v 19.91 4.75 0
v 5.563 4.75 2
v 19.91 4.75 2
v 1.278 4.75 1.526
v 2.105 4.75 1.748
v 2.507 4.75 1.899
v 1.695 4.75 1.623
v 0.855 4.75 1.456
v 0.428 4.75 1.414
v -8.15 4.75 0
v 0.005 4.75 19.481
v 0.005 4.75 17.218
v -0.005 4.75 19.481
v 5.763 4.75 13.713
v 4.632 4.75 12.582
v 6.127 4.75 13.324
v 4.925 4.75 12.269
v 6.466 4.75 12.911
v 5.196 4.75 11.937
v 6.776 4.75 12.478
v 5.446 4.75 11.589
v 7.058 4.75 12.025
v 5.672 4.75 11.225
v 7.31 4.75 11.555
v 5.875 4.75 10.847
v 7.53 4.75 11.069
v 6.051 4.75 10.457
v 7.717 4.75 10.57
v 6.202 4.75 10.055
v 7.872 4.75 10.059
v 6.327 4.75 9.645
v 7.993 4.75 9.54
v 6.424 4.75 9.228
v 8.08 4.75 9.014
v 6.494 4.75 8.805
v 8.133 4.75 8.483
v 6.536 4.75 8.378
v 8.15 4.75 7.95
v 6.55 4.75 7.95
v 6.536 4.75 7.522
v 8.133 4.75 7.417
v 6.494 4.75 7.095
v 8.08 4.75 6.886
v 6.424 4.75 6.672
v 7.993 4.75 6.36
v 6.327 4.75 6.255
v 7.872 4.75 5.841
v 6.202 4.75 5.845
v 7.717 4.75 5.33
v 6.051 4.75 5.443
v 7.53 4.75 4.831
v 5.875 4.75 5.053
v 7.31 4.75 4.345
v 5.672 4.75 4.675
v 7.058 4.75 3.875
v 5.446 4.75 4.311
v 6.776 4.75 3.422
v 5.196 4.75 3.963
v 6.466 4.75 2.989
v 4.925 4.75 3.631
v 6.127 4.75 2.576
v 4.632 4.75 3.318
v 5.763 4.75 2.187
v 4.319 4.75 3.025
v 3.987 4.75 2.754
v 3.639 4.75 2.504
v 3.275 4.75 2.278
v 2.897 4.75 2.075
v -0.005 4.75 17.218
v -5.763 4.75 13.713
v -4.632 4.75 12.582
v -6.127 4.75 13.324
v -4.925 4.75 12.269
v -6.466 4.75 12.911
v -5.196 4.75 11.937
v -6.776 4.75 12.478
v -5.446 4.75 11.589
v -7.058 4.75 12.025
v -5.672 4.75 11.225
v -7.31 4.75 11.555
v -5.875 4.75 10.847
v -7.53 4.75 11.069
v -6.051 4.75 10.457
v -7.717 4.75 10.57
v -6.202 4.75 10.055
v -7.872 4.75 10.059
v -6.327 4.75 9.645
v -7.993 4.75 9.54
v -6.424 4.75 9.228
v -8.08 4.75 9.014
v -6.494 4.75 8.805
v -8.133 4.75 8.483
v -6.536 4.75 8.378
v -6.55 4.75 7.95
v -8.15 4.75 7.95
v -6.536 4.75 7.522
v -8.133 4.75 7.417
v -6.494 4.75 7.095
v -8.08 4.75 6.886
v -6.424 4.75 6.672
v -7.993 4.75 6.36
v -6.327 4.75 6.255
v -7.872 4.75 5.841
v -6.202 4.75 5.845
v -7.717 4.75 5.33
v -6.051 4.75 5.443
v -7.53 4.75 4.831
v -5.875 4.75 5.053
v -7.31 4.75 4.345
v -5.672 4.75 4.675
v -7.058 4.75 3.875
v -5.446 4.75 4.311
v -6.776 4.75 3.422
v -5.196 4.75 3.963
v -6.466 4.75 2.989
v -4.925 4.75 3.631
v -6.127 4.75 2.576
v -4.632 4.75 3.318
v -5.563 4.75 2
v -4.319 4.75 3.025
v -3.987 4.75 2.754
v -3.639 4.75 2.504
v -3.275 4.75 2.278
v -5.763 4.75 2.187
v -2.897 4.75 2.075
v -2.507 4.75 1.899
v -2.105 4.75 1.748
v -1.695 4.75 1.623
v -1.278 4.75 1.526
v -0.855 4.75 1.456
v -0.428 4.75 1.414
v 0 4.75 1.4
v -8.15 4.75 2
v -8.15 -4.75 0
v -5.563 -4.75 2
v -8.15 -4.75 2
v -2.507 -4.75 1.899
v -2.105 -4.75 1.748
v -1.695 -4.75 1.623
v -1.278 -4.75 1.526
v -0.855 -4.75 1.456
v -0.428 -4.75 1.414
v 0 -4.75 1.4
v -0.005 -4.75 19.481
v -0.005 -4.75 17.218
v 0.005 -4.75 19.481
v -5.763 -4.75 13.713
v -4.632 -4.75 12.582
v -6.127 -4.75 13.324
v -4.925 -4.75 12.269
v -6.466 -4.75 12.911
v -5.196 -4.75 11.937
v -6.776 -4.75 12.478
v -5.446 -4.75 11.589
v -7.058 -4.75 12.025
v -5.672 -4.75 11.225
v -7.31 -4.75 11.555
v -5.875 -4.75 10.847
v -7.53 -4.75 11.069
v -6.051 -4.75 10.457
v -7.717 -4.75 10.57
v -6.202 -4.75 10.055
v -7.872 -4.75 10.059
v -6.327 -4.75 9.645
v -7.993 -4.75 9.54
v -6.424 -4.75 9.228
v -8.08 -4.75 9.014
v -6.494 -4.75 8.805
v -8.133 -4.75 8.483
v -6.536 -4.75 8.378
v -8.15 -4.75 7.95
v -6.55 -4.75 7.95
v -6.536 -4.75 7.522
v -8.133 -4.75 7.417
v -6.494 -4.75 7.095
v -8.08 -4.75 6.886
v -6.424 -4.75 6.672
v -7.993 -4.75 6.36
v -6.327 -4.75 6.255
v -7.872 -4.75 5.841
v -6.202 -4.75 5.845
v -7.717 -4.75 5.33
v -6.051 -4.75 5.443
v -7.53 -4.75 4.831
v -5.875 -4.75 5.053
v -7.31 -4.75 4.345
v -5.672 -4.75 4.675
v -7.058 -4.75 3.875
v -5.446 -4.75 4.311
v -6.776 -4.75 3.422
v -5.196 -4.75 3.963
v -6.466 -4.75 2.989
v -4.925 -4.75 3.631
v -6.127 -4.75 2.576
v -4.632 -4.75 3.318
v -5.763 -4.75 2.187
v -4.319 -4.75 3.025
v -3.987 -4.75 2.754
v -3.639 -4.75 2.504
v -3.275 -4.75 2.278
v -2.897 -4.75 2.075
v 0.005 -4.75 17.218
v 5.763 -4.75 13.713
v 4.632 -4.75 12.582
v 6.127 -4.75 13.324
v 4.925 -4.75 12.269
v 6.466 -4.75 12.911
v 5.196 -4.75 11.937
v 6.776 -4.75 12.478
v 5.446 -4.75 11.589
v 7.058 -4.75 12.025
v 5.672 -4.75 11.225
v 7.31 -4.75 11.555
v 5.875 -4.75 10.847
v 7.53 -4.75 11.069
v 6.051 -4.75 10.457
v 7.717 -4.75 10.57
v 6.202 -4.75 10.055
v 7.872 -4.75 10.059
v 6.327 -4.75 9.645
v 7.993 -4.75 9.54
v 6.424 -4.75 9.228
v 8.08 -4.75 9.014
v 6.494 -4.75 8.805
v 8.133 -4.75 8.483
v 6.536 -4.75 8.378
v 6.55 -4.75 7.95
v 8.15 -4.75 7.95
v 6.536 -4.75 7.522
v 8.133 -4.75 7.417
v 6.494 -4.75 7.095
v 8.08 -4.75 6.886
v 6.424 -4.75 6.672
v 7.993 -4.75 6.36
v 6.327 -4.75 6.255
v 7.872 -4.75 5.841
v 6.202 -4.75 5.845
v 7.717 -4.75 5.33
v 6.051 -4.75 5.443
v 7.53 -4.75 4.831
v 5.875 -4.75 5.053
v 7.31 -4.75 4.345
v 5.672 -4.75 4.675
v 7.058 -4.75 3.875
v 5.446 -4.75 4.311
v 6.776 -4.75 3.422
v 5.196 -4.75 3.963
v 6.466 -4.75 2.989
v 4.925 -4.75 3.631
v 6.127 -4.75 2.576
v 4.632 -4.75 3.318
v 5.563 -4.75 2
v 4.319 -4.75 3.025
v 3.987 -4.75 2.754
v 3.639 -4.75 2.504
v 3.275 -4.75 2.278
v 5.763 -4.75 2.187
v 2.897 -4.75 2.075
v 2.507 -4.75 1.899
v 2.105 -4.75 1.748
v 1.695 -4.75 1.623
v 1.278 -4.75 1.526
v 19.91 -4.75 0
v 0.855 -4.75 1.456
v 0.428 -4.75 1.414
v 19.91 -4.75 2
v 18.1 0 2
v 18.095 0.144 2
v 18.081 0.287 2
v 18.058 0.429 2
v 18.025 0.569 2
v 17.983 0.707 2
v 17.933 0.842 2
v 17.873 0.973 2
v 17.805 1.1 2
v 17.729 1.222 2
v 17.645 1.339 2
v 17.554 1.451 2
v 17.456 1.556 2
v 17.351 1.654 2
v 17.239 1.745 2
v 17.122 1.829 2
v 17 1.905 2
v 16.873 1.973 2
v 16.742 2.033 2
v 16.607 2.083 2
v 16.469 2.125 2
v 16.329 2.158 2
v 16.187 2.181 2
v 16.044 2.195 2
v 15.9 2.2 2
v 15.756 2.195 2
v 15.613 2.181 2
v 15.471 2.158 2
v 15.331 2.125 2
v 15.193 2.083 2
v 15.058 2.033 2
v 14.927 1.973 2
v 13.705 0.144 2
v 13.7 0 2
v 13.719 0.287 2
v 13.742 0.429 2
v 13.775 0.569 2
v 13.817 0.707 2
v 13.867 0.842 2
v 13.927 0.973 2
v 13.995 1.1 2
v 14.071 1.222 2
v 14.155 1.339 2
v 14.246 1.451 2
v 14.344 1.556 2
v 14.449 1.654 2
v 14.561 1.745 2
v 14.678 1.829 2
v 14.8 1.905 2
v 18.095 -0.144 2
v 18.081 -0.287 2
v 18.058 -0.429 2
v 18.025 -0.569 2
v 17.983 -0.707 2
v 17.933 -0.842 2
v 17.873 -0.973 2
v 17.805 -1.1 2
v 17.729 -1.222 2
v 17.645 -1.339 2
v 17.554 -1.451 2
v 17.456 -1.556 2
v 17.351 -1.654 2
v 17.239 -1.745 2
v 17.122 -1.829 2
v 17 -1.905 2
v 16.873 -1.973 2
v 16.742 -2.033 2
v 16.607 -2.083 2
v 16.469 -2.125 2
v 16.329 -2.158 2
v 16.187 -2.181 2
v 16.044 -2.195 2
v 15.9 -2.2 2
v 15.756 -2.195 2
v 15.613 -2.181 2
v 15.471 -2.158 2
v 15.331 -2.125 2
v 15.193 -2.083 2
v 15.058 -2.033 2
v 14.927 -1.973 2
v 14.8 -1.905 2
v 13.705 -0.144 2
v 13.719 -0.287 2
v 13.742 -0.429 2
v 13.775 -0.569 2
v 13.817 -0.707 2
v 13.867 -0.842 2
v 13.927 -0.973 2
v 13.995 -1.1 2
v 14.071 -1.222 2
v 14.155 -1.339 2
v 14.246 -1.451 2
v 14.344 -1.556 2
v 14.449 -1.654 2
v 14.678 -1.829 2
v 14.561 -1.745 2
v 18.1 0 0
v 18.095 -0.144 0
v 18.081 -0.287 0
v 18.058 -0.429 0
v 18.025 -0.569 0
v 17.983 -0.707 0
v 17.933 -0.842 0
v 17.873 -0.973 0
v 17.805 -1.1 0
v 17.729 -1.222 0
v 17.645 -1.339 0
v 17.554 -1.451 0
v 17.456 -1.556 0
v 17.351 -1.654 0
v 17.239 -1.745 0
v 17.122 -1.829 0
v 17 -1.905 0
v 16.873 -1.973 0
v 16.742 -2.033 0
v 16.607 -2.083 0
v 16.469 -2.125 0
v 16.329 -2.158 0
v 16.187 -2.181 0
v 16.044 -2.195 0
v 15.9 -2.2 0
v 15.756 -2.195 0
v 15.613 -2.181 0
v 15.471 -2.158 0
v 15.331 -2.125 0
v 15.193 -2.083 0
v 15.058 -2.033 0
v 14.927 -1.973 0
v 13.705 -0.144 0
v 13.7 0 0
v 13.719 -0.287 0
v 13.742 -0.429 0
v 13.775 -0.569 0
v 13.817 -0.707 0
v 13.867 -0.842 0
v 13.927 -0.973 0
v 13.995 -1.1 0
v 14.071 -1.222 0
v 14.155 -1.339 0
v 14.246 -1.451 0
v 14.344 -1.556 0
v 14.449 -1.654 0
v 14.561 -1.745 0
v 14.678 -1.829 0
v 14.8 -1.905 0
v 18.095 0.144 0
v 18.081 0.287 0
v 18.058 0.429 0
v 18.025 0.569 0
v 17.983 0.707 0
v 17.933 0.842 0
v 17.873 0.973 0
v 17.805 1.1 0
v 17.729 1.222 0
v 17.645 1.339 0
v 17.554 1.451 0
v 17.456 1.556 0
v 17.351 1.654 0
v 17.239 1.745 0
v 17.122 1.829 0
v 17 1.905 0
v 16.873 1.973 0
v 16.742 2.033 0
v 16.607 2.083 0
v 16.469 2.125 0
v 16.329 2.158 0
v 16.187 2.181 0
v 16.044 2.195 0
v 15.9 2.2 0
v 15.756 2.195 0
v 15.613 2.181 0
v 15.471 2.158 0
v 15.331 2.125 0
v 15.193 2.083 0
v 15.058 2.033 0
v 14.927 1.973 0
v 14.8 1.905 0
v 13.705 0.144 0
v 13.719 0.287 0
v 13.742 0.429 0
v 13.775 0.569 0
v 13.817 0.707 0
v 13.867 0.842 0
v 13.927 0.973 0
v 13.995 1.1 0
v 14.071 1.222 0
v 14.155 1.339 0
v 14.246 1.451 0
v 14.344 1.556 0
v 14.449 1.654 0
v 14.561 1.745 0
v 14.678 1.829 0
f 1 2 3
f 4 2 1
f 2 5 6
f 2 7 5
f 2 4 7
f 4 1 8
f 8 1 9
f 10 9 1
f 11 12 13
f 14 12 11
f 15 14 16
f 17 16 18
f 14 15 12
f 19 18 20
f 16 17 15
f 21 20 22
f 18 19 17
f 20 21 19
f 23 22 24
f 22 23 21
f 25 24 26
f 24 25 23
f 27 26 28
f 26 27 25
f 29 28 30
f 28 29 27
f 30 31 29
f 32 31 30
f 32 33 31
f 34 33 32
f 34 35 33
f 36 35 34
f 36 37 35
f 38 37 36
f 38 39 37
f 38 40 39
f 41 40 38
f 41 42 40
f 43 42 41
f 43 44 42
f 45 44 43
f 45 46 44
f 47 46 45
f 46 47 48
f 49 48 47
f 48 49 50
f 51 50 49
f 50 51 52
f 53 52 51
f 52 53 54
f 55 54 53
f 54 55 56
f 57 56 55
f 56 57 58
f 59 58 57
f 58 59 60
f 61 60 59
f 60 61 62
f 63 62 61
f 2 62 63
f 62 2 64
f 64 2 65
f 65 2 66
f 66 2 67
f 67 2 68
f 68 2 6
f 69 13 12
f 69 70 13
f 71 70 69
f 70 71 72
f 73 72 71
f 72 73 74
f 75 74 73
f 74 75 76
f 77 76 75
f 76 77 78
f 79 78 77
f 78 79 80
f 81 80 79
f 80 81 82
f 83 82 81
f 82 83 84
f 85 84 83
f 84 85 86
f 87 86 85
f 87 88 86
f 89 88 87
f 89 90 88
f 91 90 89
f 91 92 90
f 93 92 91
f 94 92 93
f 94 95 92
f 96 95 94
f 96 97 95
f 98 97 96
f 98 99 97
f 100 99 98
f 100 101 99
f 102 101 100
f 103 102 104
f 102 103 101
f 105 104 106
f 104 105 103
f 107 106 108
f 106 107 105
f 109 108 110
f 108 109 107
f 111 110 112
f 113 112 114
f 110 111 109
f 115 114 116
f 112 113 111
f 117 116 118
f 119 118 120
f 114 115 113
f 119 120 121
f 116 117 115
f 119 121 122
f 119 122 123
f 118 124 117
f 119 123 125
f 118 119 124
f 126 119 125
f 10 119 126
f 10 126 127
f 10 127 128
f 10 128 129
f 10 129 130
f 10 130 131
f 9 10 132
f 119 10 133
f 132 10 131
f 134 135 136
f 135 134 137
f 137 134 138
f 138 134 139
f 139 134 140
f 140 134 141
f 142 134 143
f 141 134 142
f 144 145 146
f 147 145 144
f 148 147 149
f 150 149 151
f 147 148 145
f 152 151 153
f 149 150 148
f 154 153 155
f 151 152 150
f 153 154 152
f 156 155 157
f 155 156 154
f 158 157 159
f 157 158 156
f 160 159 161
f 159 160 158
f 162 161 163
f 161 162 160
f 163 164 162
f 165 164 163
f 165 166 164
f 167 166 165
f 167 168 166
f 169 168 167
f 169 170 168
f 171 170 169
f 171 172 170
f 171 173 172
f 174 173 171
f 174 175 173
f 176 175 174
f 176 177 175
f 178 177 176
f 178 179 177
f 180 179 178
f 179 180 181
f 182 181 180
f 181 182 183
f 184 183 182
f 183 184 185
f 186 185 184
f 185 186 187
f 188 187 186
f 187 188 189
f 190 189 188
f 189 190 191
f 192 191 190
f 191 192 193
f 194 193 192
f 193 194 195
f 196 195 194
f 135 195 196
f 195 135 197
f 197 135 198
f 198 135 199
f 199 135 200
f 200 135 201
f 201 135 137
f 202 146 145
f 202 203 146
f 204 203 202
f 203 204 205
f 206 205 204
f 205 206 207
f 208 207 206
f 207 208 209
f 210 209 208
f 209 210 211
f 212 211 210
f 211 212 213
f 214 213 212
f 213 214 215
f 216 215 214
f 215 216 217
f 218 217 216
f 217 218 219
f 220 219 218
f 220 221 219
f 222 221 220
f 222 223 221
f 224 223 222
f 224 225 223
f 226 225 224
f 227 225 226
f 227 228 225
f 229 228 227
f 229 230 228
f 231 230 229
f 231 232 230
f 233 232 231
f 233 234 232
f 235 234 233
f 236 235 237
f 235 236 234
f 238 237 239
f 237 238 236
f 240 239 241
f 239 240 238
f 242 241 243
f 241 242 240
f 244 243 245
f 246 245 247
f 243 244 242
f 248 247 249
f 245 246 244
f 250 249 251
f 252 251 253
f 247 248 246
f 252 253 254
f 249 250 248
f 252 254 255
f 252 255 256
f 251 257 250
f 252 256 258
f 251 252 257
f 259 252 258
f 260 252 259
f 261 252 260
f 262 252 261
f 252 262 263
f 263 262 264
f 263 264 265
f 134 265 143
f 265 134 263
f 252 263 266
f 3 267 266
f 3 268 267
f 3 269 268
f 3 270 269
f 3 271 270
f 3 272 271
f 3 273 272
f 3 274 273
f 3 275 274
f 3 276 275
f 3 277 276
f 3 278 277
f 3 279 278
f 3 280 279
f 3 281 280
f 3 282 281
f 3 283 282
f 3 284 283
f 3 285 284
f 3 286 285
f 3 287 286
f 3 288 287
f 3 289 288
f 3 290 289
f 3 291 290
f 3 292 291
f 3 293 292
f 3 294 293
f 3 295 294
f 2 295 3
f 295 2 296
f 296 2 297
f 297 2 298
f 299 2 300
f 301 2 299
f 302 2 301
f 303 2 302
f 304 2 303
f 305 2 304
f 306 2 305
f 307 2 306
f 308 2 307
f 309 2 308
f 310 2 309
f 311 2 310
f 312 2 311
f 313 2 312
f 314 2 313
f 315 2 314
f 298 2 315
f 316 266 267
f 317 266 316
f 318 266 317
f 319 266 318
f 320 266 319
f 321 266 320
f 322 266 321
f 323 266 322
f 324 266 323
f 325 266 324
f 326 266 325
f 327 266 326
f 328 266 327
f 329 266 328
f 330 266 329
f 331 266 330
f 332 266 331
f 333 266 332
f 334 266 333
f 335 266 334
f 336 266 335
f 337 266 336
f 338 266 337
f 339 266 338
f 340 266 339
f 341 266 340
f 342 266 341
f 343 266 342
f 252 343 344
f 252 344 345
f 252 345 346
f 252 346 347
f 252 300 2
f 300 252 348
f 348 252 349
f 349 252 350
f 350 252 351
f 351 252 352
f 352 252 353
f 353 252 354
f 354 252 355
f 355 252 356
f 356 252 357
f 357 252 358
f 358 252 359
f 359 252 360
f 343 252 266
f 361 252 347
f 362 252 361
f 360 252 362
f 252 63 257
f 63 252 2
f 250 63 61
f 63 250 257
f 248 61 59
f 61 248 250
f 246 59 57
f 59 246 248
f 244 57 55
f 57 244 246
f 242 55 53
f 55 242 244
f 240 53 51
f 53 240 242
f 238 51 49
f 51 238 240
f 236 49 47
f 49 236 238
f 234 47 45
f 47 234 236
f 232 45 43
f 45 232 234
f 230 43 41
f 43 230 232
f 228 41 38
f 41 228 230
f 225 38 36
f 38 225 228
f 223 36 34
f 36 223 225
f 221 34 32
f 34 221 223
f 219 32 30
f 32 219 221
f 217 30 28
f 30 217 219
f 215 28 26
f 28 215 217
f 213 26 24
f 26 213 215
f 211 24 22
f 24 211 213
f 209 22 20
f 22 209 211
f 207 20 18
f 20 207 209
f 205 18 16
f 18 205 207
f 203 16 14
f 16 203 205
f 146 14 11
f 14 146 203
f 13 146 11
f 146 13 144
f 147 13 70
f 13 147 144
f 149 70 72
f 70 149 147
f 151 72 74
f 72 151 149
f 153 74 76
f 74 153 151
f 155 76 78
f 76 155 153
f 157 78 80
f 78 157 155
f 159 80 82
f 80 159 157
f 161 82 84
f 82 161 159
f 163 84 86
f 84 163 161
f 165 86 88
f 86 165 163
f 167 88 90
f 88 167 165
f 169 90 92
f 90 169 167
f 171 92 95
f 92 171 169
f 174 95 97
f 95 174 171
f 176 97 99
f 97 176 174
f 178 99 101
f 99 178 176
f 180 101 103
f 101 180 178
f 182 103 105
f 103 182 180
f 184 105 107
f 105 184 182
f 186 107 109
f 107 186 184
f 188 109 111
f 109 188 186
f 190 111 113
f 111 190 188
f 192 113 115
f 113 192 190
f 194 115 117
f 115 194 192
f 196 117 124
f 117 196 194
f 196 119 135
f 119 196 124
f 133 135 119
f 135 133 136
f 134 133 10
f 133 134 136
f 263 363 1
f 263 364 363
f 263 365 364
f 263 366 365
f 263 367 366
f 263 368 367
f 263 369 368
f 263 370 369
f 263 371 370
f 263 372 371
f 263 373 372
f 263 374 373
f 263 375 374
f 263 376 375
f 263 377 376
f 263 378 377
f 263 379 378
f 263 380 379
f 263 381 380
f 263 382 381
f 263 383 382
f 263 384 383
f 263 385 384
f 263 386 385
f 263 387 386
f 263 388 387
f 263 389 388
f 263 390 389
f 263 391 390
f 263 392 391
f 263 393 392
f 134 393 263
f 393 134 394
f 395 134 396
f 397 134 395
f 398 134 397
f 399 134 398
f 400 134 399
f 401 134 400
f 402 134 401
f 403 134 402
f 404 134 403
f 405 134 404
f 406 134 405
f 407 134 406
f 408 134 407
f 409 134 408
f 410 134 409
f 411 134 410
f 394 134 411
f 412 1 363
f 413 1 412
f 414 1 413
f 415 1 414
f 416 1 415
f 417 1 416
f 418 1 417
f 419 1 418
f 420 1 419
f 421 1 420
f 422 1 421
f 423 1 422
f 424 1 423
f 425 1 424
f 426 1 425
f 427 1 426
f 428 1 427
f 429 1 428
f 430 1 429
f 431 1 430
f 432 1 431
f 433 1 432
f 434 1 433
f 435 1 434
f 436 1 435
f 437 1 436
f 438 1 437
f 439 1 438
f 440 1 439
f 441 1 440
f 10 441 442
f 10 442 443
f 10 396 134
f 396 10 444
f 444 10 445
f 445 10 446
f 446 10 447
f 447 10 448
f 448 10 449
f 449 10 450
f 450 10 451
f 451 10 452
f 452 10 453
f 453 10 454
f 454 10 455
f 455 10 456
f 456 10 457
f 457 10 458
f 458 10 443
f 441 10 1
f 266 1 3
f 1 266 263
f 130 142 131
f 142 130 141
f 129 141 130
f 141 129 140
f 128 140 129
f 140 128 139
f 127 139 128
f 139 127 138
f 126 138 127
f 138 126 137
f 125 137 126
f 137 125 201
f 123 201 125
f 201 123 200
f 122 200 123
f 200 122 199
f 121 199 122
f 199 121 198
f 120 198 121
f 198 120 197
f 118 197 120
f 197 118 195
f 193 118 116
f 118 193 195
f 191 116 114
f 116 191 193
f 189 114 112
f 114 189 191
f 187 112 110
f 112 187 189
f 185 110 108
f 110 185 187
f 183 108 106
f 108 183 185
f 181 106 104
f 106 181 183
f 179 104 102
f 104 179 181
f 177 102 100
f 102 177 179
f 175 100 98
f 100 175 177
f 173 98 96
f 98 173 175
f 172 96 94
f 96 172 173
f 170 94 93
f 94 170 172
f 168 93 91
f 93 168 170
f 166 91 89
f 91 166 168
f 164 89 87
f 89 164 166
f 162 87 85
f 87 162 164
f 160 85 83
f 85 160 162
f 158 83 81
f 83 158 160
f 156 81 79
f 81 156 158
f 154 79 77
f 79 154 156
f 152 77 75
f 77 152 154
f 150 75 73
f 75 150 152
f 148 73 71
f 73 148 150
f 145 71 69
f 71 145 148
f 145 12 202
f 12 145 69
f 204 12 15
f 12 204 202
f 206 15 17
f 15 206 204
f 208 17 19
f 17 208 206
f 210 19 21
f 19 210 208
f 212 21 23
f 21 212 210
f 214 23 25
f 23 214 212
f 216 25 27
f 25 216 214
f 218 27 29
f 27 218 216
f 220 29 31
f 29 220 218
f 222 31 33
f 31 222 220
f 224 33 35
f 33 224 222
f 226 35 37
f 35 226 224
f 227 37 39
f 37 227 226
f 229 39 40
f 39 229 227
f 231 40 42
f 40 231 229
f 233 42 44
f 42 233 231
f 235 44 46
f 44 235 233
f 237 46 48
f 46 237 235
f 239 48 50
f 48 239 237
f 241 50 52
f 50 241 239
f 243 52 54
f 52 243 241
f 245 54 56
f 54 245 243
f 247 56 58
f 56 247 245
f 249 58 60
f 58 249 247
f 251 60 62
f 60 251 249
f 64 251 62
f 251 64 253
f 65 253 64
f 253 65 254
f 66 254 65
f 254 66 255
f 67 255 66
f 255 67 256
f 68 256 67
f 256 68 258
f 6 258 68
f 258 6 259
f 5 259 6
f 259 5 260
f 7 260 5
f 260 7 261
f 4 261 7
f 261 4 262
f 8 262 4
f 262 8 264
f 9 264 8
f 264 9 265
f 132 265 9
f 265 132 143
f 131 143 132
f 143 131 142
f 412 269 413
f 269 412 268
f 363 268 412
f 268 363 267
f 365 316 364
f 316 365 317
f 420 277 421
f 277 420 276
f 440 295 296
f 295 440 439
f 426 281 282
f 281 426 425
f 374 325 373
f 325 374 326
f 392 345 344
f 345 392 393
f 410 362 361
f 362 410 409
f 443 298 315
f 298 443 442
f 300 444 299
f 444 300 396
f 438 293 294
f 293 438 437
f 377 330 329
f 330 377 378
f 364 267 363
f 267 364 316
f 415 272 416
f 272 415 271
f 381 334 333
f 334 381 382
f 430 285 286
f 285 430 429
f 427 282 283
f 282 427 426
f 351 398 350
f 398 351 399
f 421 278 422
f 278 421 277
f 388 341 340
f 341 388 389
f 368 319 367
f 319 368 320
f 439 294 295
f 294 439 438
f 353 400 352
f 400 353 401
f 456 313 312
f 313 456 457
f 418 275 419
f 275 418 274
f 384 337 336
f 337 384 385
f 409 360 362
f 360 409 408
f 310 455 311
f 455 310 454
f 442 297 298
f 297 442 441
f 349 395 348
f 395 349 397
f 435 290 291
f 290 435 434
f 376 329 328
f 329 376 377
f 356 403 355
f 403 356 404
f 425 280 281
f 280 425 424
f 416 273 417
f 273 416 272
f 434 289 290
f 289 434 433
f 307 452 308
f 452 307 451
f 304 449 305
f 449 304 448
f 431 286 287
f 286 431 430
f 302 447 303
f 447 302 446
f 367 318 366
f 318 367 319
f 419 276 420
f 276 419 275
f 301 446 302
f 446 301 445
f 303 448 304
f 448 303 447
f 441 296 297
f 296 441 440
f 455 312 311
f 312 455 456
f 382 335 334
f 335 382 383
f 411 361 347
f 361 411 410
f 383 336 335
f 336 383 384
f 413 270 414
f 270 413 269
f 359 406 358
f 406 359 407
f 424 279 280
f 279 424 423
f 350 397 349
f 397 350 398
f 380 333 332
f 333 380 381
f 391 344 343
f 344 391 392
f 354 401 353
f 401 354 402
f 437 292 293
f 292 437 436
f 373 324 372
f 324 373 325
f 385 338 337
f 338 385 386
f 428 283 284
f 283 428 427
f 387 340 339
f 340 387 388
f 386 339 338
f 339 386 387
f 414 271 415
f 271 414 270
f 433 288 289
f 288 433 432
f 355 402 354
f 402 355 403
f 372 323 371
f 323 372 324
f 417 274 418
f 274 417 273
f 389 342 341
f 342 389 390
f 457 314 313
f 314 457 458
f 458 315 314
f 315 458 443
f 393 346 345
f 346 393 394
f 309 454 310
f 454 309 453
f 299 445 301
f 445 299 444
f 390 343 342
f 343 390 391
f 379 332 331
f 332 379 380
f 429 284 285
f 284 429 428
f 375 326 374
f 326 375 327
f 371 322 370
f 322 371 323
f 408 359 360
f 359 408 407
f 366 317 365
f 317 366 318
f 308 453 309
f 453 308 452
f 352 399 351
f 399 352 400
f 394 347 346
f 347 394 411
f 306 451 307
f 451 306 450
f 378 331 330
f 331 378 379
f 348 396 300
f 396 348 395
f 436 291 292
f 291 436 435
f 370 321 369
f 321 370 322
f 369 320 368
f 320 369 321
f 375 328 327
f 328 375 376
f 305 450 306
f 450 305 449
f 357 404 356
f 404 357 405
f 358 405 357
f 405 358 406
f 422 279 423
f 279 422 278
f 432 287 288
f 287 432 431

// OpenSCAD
// Loop clamp printed standing on its loop and tab. The loop has a pointed
// roof so its top prints without support; the tab lies flat on the bed.
cable_diameter = 12.7;
loop_width = 9.5;
hole_diameter = 4.4;
hole_x = 15.9;
wall = 1.6;
tab = 2.0;
$fn = 96;

zc = 7.95;
r = cable_diameter/2 + 0.2;

module drop(rr) {
    hull() {
        translate([0, zc]) circle(r = rr);
        translate([0, zc + rr*sqrt(2)]) square(0.01, center = true);
    }
}

difference() {
    rotate([90, 0, 0]) linear_extrude(loop_width, center = true)
        difference() {
            union() {
                intersection() {
                    drop(r + wall);
                    translate([-50, 0]) square([100, 50]);
                }
                hull() {
                    translate([0, 0]) square([1, tab]);
                    translate([hole_x + 4, 0]) square([0.01, tab]);
                }
                translate([-r - wall, 0]) square([r + wall, tab]);
            }
            drop(r);
        }
    translate([hole_x, 0, -1]) cylinder(d = hole_diameter, h = tab + 2);
}
